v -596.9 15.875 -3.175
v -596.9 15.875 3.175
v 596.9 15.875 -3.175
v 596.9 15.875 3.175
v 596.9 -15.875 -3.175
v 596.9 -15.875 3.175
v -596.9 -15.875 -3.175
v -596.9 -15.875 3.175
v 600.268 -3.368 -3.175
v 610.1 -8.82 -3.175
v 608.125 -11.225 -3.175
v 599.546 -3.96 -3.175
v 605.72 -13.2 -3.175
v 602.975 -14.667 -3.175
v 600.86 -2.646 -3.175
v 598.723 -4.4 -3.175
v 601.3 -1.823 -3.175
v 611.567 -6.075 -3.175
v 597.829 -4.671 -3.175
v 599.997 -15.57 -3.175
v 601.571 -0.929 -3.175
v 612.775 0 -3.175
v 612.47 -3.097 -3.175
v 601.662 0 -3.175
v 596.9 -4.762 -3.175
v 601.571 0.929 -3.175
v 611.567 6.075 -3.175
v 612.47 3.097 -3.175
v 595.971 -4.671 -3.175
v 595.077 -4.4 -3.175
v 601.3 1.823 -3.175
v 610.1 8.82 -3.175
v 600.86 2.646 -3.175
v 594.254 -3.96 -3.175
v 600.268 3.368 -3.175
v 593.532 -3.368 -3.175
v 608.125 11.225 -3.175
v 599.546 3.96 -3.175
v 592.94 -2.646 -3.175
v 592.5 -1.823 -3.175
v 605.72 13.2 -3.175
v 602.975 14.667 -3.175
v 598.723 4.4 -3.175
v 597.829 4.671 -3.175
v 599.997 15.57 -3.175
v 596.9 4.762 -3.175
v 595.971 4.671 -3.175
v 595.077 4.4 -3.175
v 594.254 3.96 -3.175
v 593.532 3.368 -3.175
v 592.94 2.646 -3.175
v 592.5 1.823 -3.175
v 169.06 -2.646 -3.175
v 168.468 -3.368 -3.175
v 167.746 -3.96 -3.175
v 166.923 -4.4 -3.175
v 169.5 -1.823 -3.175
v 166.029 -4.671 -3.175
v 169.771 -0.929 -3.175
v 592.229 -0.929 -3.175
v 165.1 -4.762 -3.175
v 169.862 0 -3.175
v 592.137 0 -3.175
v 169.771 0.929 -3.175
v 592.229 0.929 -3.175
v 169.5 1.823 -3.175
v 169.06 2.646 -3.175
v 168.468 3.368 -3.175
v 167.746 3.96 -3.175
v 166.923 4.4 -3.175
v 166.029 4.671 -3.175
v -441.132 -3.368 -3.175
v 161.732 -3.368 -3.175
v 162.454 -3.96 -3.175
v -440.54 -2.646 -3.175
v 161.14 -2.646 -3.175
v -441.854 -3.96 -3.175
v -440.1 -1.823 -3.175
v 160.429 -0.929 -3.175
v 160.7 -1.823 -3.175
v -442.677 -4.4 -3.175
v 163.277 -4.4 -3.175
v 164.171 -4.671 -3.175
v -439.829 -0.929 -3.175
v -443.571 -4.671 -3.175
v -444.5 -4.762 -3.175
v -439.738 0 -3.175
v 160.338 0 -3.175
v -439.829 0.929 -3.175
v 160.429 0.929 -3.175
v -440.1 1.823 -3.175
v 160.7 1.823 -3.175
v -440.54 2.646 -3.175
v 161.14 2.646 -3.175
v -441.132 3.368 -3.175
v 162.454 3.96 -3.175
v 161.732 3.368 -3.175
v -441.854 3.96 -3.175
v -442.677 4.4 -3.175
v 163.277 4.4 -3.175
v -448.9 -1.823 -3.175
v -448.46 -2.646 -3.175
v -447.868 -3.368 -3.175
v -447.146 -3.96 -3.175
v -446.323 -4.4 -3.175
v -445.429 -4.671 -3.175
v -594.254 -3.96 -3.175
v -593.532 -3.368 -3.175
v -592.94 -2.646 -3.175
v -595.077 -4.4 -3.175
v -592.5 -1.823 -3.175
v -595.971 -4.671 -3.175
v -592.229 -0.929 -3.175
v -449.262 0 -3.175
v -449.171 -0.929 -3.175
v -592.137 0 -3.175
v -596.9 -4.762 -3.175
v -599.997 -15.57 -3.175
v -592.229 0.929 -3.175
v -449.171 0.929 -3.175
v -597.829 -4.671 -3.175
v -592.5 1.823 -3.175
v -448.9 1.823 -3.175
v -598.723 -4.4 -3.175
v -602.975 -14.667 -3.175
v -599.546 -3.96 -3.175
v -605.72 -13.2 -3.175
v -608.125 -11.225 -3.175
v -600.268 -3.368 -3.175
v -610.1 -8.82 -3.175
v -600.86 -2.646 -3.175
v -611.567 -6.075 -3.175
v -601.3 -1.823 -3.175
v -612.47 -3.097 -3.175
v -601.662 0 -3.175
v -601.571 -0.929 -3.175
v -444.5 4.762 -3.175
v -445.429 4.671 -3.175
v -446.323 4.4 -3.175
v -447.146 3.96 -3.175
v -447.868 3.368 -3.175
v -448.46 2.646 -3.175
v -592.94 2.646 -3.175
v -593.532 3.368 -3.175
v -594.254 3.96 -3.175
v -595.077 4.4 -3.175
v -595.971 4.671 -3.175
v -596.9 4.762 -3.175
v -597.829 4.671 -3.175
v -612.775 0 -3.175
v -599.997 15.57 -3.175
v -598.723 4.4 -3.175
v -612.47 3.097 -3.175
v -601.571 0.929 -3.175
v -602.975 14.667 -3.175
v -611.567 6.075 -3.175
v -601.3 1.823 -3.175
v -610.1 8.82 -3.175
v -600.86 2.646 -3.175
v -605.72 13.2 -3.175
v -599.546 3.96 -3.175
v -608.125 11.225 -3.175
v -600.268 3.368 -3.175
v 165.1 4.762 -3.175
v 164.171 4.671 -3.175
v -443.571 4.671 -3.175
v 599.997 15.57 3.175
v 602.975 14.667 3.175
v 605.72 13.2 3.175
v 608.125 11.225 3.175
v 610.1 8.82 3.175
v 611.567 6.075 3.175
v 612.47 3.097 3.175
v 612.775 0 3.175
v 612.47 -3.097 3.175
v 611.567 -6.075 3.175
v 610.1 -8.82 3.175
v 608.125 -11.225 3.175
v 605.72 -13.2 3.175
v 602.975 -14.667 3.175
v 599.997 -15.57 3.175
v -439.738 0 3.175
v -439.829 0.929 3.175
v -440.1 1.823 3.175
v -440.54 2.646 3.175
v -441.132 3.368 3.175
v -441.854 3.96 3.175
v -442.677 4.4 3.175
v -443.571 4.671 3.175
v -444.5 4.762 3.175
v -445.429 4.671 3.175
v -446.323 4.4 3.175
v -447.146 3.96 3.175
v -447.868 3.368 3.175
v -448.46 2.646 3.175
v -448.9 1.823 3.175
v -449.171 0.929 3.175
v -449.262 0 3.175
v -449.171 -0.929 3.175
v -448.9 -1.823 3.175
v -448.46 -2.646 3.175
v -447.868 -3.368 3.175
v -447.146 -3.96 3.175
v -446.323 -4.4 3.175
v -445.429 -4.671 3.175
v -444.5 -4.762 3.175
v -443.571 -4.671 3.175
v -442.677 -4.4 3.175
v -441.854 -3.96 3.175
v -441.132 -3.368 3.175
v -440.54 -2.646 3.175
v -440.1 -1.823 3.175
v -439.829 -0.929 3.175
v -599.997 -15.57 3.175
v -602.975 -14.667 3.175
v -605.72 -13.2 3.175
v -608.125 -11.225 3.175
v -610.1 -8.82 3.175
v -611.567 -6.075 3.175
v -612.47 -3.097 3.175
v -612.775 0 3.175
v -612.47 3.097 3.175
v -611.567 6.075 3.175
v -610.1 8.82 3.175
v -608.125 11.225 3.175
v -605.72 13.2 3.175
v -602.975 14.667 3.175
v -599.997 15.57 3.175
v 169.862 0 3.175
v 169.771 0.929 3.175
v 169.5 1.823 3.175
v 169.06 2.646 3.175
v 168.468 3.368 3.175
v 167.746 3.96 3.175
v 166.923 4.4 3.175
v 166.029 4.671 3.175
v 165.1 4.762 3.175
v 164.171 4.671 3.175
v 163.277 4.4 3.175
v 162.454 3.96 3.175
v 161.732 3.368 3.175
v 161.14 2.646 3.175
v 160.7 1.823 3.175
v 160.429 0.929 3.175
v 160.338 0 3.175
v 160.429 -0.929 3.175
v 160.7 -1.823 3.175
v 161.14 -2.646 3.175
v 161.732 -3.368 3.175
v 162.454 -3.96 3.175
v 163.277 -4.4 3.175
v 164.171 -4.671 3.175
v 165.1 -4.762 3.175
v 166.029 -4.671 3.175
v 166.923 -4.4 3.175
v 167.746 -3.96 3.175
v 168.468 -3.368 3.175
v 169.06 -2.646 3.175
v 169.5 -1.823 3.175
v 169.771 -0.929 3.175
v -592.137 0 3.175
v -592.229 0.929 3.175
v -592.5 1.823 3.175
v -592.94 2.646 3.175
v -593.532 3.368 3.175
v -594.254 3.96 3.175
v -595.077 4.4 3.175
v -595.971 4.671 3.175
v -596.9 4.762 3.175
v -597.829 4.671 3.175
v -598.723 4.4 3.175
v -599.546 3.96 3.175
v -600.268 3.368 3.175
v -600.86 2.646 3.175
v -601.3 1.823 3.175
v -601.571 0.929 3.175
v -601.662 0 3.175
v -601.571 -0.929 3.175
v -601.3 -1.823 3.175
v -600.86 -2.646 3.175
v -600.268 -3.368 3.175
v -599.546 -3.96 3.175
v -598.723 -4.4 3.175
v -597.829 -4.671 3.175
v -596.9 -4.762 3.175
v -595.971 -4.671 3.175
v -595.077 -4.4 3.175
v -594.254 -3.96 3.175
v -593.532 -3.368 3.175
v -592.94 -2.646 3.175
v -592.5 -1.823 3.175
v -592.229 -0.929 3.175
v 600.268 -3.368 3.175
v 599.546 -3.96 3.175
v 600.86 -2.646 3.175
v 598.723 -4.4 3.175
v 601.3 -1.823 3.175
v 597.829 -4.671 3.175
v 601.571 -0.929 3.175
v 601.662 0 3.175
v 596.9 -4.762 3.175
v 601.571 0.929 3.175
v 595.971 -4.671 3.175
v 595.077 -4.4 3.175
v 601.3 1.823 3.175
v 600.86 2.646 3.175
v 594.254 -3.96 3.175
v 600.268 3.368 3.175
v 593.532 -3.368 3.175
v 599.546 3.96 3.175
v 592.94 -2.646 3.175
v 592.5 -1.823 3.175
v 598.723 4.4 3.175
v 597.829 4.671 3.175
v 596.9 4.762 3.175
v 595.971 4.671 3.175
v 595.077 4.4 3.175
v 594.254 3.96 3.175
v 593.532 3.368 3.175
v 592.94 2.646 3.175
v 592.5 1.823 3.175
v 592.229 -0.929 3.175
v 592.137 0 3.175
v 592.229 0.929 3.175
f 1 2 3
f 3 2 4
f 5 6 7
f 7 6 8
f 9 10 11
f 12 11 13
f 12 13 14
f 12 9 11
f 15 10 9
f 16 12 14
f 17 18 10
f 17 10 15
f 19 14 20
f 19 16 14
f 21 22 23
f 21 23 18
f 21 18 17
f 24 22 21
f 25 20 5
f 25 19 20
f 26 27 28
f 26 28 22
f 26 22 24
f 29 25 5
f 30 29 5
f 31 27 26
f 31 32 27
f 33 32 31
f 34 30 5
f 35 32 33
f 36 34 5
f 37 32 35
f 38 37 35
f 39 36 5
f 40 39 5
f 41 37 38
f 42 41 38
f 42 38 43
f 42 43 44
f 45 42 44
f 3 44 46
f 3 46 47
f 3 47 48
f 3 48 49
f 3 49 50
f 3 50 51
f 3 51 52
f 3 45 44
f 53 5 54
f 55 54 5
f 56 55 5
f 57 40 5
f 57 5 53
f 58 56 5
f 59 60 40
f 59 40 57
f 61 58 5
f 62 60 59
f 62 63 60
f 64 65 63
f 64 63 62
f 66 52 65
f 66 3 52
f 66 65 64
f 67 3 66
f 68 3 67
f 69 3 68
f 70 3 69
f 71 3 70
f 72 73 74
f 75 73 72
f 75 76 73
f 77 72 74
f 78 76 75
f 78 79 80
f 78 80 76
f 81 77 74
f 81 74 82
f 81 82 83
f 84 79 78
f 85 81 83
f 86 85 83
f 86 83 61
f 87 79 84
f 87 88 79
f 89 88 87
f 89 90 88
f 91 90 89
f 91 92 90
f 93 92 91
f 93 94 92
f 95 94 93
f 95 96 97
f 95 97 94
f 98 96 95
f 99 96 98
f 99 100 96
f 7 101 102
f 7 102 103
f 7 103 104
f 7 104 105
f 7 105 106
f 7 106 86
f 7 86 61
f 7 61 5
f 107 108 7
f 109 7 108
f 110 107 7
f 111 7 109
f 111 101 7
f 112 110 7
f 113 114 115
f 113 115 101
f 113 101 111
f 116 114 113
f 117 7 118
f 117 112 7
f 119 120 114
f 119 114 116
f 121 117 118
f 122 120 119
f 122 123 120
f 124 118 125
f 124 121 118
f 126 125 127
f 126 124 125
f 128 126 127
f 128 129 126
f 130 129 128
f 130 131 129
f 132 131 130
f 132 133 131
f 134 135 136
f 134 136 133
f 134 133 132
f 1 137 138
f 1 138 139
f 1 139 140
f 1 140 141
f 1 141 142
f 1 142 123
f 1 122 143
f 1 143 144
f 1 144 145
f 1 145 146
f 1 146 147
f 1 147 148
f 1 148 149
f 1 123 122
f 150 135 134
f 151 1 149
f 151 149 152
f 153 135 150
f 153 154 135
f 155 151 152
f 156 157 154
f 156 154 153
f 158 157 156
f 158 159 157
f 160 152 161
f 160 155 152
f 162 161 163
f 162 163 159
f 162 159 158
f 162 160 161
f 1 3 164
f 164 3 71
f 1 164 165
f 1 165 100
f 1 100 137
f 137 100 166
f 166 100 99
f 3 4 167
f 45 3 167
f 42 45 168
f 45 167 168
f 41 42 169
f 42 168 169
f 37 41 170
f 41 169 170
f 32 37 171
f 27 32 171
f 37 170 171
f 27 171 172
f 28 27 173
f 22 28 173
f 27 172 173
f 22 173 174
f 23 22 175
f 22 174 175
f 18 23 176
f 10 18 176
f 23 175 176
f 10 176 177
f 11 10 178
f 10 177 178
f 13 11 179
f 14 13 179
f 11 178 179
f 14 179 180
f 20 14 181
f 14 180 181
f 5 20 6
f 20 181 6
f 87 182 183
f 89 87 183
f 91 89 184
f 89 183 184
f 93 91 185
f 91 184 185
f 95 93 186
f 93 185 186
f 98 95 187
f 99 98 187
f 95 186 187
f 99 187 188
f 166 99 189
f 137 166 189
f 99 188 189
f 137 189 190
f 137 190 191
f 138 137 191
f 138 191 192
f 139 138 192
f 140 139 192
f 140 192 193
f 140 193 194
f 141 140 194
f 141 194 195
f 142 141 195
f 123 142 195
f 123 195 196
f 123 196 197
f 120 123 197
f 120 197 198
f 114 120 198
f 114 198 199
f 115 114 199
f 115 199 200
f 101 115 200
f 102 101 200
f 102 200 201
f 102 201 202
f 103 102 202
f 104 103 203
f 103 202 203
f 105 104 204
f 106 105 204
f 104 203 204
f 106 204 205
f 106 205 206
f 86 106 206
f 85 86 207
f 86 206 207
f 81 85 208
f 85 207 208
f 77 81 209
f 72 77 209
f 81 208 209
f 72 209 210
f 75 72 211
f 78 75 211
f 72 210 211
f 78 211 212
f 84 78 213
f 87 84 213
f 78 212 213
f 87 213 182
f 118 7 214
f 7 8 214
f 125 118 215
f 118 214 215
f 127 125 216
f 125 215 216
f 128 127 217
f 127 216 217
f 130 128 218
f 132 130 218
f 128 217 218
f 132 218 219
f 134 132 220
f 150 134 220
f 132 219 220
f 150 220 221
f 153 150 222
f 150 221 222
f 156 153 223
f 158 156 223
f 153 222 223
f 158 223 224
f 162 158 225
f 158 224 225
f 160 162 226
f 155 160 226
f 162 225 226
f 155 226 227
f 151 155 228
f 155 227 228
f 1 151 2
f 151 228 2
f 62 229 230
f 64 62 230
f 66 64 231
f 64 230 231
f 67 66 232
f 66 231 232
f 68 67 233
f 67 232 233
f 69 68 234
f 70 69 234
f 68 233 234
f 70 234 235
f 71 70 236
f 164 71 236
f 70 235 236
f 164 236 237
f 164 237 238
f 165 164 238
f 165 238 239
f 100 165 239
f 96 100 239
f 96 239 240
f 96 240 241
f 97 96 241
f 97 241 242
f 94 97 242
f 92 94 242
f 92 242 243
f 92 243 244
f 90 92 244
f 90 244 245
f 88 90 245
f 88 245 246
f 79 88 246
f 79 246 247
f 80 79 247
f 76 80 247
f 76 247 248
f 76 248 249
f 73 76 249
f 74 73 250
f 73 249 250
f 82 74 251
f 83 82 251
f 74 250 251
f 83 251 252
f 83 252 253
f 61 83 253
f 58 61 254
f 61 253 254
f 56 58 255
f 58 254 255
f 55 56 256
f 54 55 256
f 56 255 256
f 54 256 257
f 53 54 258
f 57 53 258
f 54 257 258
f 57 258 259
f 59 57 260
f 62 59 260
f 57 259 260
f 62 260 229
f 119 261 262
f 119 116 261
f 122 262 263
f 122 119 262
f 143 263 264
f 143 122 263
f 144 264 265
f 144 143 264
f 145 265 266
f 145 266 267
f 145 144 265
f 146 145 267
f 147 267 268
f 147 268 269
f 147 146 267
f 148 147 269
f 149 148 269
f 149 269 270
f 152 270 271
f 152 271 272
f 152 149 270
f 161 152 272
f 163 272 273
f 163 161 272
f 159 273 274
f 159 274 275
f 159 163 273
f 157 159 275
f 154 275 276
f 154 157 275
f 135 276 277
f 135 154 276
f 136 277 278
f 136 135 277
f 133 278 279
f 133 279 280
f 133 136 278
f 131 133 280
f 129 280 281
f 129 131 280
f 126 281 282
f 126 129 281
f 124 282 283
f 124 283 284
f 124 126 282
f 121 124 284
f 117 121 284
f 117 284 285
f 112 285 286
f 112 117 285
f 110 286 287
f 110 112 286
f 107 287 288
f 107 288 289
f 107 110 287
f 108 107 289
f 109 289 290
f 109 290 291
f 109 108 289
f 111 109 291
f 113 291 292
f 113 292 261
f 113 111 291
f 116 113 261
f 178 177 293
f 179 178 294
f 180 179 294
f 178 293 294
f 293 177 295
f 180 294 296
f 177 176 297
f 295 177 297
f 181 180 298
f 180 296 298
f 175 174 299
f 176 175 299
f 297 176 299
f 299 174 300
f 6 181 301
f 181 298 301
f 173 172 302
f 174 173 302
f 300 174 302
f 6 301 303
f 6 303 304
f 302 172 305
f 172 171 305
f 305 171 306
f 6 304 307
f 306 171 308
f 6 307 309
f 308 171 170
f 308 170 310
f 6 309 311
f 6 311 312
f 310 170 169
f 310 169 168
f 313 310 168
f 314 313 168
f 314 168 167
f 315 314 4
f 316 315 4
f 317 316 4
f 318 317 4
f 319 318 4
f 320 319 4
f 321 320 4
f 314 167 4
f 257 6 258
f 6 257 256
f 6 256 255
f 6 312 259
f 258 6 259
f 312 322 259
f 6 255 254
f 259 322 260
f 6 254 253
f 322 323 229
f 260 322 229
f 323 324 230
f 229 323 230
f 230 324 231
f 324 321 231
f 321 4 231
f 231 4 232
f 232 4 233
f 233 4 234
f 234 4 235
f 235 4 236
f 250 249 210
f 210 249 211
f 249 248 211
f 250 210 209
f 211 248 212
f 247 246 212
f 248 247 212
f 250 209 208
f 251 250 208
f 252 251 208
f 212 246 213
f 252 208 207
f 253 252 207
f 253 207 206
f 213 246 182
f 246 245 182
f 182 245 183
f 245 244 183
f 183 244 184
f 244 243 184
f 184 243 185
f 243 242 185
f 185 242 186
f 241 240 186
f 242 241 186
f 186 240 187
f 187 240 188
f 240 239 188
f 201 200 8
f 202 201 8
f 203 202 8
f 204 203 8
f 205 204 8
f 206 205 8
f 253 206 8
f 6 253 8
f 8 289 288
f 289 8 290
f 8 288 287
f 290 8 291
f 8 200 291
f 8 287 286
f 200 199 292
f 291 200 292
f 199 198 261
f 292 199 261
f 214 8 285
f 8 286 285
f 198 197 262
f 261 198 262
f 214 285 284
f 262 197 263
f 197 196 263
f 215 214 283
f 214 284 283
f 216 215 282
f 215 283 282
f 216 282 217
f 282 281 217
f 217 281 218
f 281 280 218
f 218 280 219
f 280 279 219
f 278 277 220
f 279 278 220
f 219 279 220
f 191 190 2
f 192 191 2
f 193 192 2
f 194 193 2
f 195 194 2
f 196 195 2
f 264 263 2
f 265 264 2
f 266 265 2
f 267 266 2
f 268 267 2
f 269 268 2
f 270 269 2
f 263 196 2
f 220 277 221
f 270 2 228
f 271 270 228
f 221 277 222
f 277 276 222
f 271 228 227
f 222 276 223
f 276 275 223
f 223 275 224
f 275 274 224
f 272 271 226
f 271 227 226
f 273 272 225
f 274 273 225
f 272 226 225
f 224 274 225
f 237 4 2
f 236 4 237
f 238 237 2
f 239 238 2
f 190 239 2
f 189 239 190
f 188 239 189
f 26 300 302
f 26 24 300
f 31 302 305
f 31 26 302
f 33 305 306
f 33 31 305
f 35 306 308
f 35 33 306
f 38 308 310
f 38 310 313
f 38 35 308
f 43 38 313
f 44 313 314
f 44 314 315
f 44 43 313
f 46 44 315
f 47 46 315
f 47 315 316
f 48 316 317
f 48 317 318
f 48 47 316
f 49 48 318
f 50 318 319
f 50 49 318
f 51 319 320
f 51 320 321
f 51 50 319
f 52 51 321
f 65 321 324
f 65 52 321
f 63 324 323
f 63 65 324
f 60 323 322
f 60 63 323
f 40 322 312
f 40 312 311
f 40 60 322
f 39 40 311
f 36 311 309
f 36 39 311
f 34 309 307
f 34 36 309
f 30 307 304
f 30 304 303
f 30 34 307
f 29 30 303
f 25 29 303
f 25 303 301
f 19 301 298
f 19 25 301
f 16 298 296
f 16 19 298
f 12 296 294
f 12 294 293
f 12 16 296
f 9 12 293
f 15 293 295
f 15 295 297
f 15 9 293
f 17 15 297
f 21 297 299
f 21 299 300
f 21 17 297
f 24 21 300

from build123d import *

# Parameters (mm, degrees)
SKETCH1_R           = 4.7625
BOSS_EXTRUDE1_DEPTH = 3.175
SKETCH2_R           = 4.7625
CUT_EXTRUDE1_DEPTH  = 614.01348986


with BuildPart() as part:
    # Sketch1 → Boss-Extrude1 (new, symmetric)
    with BuildSketch(Plane.XY):
        with BuildLine():
            Line((596.9, -15.875), (-596.9, -15.875))
            ThreePointArc((-596.9, -15.875), (-612.775, 0), (-596.9, 15.875))
            Line((-596.9, 15.875), (596.9, 15.875))
            ThreePointArc((596.9, 15.875), (612.775, 0), (596.9, -15.875))
        make_face()
        with Locations((-596.9, 0)):
            Circle(SKETCH1_R, mode=Mode.SUBTRACT)
        with Locations((596.9, 0)):
            Circle(SKETCH1_R, mode=Mode.SUBTRACT)
    extrude(amount=BOSS_EXTRUDE1_DEPTH, both=True)

    # Sketch2 → Cut-Extrude1 (cut, through all)
    with BuildSketch(Plane.XY.offset(3.175)):
        with Locations((-444.5, 0)):
            Circle(SKETCH2_R)
        with Locations((165.1, 0)):
            Circle(SKETCH2_R)
    extrude(amount=-CUT_EXTRUDE1_DEPTH, mode=Mode.SUBTRACT)


solid = part.part
